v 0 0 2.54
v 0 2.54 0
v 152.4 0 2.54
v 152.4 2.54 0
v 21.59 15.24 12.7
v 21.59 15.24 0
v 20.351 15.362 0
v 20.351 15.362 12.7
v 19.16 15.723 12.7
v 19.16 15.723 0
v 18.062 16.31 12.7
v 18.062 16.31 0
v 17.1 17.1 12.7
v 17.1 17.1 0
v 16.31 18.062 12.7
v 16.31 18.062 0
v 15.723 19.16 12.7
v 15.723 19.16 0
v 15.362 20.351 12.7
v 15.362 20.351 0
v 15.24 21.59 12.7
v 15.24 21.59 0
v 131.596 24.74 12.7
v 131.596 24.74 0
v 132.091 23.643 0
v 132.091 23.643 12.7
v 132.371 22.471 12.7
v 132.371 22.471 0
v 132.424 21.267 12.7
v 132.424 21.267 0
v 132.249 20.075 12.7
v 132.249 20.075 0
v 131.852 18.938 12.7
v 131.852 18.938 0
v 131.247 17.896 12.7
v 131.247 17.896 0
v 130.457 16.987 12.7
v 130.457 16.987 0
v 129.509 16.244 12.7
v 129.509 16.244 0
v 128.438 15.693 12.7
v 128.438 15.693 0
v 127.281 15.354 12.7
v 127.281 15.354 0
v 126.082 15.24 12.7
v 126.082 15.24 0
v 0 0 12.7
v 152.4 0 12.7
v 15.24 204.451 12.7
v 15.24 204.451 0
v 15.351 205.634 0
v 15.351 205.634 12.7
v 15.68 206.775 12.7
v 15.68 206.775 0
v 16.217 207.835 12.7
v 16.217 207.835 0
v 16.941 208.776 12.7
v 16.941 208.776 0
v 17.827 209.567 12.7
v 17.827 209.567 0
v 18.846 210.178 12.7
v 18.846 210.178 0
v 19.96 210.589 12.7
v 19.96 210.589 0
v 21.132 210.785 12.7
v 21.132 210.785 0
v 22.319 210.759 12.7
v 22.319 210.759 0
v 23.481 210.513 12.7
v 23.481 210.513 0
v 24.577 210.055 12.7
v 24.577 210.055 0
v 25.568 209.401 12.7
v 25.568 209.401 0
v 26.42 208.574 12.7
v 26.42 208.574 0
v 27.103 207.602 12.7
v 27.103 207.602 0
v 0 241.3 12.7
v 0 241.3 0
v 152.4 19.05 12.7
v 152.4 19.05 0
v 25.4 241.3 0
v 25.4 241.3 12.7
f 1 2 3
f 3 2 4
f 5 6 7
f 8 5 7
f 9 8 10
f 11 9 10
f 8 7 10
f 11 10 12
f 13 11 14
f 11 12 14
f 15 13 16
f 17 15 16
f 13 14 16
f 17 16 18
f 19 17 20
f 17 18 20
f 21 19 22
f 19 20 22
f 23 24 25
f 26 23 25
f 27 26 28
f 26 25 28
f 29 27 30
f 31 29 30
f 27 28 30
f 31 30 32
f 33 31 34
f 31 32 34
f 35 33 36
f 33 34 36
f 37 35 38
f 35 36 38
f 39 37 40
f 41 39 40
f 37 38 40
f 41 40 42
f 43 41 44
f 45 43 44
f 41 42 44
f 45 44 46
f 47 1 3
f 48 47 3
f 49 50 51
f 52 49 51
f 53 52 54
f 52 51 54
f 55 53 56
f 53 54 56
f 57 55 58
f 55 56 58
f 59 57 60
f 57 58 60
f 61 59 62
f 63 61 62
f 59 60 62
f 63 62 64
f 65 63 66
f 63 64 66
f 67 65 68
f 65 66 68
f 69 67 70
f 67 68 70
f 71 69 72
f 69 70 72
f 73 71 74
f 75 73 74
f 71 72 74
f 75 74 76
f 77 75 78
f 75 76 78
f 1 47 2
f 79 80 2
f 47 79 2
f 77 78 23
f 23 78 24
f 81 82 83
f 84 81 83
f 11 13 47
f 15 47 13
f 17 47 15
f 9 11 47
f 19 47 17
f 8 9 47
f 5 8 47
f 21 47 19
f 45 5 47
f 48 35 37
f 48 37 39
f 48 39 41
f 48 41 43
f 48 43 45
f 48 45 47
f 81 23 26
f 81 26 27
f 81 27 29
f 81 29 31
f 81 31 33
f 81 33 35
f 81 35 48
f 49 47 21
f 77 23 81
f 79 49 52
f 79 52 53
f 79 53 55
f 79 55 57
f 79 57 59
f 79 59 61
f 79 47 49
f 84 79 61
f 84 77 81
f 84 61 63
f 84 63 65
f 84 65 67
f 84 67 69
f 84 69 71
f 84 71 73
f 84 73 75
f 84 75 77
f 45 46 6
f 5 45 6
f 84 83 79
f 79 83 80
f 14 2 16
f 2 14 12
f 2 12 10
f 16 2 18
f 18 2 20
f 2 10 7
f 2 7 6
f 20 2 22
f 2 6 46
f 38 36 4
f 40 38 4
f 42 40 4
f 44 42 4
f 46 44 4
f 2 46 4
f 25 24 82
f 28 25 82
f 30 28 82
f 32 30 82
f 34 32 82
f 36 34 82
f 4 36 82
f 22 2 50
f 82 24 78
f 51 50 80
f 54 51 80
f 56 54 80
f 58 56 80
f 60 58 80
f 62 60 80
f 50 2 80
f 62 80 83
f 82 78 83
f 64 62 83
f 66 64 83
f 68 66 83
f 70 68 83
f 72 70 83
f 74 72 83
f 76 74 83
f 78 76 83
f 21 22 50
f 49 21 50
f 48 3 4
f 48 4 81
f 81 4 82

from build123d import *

# Parameters (mm, degrees)
BASE_EXTRUDE_DEPTH = 12.7
CHAMFER3_SIZE      = 2.54


with BuildPart() as part:
    # Sketch1 → Base-Extrude (new body)
    with BuildSketch(Plane.XY):
        Polygon((0, 0), (152.4, 0), (152.4, 19.05), (25.4, 241.3), (0, 241.3), align=None)
        with BuildLine():
            Line((15.24, 21.59), (15.24, 204.451463804))
            ThreePointArc((15.24, 204.451463804), (19.960158612, 210.588736573), (27.103343952, 207.601946062))
            Line((27.103343952, 207.601946062), (131.595608983, 24.740482259))
            ThreePointArc((131.595608983, 24.740482259), (131.574444122, 18.402764704), (126.082265031, 15.24))
            Line((126.082265031, 15.24), (21.59, 15.24))
            ThreePointArc((21.59, 15.24), (17.099871939, 17.099871939), (15.24, 21.59))
        make_face(mode=Mode.SUBTRACT)
    extrude(amount=BASE_EXTRUDE_DEPTH)

    # Chamfer3
    chamfer3_edges = [part.edges().sort_by_distance(p)[0] for p in [
        (76.2, 0, 0),
    ]]
    chamfer(chamfer3_edges, length=CHAMFER3_SIZE)


solid = part.part
